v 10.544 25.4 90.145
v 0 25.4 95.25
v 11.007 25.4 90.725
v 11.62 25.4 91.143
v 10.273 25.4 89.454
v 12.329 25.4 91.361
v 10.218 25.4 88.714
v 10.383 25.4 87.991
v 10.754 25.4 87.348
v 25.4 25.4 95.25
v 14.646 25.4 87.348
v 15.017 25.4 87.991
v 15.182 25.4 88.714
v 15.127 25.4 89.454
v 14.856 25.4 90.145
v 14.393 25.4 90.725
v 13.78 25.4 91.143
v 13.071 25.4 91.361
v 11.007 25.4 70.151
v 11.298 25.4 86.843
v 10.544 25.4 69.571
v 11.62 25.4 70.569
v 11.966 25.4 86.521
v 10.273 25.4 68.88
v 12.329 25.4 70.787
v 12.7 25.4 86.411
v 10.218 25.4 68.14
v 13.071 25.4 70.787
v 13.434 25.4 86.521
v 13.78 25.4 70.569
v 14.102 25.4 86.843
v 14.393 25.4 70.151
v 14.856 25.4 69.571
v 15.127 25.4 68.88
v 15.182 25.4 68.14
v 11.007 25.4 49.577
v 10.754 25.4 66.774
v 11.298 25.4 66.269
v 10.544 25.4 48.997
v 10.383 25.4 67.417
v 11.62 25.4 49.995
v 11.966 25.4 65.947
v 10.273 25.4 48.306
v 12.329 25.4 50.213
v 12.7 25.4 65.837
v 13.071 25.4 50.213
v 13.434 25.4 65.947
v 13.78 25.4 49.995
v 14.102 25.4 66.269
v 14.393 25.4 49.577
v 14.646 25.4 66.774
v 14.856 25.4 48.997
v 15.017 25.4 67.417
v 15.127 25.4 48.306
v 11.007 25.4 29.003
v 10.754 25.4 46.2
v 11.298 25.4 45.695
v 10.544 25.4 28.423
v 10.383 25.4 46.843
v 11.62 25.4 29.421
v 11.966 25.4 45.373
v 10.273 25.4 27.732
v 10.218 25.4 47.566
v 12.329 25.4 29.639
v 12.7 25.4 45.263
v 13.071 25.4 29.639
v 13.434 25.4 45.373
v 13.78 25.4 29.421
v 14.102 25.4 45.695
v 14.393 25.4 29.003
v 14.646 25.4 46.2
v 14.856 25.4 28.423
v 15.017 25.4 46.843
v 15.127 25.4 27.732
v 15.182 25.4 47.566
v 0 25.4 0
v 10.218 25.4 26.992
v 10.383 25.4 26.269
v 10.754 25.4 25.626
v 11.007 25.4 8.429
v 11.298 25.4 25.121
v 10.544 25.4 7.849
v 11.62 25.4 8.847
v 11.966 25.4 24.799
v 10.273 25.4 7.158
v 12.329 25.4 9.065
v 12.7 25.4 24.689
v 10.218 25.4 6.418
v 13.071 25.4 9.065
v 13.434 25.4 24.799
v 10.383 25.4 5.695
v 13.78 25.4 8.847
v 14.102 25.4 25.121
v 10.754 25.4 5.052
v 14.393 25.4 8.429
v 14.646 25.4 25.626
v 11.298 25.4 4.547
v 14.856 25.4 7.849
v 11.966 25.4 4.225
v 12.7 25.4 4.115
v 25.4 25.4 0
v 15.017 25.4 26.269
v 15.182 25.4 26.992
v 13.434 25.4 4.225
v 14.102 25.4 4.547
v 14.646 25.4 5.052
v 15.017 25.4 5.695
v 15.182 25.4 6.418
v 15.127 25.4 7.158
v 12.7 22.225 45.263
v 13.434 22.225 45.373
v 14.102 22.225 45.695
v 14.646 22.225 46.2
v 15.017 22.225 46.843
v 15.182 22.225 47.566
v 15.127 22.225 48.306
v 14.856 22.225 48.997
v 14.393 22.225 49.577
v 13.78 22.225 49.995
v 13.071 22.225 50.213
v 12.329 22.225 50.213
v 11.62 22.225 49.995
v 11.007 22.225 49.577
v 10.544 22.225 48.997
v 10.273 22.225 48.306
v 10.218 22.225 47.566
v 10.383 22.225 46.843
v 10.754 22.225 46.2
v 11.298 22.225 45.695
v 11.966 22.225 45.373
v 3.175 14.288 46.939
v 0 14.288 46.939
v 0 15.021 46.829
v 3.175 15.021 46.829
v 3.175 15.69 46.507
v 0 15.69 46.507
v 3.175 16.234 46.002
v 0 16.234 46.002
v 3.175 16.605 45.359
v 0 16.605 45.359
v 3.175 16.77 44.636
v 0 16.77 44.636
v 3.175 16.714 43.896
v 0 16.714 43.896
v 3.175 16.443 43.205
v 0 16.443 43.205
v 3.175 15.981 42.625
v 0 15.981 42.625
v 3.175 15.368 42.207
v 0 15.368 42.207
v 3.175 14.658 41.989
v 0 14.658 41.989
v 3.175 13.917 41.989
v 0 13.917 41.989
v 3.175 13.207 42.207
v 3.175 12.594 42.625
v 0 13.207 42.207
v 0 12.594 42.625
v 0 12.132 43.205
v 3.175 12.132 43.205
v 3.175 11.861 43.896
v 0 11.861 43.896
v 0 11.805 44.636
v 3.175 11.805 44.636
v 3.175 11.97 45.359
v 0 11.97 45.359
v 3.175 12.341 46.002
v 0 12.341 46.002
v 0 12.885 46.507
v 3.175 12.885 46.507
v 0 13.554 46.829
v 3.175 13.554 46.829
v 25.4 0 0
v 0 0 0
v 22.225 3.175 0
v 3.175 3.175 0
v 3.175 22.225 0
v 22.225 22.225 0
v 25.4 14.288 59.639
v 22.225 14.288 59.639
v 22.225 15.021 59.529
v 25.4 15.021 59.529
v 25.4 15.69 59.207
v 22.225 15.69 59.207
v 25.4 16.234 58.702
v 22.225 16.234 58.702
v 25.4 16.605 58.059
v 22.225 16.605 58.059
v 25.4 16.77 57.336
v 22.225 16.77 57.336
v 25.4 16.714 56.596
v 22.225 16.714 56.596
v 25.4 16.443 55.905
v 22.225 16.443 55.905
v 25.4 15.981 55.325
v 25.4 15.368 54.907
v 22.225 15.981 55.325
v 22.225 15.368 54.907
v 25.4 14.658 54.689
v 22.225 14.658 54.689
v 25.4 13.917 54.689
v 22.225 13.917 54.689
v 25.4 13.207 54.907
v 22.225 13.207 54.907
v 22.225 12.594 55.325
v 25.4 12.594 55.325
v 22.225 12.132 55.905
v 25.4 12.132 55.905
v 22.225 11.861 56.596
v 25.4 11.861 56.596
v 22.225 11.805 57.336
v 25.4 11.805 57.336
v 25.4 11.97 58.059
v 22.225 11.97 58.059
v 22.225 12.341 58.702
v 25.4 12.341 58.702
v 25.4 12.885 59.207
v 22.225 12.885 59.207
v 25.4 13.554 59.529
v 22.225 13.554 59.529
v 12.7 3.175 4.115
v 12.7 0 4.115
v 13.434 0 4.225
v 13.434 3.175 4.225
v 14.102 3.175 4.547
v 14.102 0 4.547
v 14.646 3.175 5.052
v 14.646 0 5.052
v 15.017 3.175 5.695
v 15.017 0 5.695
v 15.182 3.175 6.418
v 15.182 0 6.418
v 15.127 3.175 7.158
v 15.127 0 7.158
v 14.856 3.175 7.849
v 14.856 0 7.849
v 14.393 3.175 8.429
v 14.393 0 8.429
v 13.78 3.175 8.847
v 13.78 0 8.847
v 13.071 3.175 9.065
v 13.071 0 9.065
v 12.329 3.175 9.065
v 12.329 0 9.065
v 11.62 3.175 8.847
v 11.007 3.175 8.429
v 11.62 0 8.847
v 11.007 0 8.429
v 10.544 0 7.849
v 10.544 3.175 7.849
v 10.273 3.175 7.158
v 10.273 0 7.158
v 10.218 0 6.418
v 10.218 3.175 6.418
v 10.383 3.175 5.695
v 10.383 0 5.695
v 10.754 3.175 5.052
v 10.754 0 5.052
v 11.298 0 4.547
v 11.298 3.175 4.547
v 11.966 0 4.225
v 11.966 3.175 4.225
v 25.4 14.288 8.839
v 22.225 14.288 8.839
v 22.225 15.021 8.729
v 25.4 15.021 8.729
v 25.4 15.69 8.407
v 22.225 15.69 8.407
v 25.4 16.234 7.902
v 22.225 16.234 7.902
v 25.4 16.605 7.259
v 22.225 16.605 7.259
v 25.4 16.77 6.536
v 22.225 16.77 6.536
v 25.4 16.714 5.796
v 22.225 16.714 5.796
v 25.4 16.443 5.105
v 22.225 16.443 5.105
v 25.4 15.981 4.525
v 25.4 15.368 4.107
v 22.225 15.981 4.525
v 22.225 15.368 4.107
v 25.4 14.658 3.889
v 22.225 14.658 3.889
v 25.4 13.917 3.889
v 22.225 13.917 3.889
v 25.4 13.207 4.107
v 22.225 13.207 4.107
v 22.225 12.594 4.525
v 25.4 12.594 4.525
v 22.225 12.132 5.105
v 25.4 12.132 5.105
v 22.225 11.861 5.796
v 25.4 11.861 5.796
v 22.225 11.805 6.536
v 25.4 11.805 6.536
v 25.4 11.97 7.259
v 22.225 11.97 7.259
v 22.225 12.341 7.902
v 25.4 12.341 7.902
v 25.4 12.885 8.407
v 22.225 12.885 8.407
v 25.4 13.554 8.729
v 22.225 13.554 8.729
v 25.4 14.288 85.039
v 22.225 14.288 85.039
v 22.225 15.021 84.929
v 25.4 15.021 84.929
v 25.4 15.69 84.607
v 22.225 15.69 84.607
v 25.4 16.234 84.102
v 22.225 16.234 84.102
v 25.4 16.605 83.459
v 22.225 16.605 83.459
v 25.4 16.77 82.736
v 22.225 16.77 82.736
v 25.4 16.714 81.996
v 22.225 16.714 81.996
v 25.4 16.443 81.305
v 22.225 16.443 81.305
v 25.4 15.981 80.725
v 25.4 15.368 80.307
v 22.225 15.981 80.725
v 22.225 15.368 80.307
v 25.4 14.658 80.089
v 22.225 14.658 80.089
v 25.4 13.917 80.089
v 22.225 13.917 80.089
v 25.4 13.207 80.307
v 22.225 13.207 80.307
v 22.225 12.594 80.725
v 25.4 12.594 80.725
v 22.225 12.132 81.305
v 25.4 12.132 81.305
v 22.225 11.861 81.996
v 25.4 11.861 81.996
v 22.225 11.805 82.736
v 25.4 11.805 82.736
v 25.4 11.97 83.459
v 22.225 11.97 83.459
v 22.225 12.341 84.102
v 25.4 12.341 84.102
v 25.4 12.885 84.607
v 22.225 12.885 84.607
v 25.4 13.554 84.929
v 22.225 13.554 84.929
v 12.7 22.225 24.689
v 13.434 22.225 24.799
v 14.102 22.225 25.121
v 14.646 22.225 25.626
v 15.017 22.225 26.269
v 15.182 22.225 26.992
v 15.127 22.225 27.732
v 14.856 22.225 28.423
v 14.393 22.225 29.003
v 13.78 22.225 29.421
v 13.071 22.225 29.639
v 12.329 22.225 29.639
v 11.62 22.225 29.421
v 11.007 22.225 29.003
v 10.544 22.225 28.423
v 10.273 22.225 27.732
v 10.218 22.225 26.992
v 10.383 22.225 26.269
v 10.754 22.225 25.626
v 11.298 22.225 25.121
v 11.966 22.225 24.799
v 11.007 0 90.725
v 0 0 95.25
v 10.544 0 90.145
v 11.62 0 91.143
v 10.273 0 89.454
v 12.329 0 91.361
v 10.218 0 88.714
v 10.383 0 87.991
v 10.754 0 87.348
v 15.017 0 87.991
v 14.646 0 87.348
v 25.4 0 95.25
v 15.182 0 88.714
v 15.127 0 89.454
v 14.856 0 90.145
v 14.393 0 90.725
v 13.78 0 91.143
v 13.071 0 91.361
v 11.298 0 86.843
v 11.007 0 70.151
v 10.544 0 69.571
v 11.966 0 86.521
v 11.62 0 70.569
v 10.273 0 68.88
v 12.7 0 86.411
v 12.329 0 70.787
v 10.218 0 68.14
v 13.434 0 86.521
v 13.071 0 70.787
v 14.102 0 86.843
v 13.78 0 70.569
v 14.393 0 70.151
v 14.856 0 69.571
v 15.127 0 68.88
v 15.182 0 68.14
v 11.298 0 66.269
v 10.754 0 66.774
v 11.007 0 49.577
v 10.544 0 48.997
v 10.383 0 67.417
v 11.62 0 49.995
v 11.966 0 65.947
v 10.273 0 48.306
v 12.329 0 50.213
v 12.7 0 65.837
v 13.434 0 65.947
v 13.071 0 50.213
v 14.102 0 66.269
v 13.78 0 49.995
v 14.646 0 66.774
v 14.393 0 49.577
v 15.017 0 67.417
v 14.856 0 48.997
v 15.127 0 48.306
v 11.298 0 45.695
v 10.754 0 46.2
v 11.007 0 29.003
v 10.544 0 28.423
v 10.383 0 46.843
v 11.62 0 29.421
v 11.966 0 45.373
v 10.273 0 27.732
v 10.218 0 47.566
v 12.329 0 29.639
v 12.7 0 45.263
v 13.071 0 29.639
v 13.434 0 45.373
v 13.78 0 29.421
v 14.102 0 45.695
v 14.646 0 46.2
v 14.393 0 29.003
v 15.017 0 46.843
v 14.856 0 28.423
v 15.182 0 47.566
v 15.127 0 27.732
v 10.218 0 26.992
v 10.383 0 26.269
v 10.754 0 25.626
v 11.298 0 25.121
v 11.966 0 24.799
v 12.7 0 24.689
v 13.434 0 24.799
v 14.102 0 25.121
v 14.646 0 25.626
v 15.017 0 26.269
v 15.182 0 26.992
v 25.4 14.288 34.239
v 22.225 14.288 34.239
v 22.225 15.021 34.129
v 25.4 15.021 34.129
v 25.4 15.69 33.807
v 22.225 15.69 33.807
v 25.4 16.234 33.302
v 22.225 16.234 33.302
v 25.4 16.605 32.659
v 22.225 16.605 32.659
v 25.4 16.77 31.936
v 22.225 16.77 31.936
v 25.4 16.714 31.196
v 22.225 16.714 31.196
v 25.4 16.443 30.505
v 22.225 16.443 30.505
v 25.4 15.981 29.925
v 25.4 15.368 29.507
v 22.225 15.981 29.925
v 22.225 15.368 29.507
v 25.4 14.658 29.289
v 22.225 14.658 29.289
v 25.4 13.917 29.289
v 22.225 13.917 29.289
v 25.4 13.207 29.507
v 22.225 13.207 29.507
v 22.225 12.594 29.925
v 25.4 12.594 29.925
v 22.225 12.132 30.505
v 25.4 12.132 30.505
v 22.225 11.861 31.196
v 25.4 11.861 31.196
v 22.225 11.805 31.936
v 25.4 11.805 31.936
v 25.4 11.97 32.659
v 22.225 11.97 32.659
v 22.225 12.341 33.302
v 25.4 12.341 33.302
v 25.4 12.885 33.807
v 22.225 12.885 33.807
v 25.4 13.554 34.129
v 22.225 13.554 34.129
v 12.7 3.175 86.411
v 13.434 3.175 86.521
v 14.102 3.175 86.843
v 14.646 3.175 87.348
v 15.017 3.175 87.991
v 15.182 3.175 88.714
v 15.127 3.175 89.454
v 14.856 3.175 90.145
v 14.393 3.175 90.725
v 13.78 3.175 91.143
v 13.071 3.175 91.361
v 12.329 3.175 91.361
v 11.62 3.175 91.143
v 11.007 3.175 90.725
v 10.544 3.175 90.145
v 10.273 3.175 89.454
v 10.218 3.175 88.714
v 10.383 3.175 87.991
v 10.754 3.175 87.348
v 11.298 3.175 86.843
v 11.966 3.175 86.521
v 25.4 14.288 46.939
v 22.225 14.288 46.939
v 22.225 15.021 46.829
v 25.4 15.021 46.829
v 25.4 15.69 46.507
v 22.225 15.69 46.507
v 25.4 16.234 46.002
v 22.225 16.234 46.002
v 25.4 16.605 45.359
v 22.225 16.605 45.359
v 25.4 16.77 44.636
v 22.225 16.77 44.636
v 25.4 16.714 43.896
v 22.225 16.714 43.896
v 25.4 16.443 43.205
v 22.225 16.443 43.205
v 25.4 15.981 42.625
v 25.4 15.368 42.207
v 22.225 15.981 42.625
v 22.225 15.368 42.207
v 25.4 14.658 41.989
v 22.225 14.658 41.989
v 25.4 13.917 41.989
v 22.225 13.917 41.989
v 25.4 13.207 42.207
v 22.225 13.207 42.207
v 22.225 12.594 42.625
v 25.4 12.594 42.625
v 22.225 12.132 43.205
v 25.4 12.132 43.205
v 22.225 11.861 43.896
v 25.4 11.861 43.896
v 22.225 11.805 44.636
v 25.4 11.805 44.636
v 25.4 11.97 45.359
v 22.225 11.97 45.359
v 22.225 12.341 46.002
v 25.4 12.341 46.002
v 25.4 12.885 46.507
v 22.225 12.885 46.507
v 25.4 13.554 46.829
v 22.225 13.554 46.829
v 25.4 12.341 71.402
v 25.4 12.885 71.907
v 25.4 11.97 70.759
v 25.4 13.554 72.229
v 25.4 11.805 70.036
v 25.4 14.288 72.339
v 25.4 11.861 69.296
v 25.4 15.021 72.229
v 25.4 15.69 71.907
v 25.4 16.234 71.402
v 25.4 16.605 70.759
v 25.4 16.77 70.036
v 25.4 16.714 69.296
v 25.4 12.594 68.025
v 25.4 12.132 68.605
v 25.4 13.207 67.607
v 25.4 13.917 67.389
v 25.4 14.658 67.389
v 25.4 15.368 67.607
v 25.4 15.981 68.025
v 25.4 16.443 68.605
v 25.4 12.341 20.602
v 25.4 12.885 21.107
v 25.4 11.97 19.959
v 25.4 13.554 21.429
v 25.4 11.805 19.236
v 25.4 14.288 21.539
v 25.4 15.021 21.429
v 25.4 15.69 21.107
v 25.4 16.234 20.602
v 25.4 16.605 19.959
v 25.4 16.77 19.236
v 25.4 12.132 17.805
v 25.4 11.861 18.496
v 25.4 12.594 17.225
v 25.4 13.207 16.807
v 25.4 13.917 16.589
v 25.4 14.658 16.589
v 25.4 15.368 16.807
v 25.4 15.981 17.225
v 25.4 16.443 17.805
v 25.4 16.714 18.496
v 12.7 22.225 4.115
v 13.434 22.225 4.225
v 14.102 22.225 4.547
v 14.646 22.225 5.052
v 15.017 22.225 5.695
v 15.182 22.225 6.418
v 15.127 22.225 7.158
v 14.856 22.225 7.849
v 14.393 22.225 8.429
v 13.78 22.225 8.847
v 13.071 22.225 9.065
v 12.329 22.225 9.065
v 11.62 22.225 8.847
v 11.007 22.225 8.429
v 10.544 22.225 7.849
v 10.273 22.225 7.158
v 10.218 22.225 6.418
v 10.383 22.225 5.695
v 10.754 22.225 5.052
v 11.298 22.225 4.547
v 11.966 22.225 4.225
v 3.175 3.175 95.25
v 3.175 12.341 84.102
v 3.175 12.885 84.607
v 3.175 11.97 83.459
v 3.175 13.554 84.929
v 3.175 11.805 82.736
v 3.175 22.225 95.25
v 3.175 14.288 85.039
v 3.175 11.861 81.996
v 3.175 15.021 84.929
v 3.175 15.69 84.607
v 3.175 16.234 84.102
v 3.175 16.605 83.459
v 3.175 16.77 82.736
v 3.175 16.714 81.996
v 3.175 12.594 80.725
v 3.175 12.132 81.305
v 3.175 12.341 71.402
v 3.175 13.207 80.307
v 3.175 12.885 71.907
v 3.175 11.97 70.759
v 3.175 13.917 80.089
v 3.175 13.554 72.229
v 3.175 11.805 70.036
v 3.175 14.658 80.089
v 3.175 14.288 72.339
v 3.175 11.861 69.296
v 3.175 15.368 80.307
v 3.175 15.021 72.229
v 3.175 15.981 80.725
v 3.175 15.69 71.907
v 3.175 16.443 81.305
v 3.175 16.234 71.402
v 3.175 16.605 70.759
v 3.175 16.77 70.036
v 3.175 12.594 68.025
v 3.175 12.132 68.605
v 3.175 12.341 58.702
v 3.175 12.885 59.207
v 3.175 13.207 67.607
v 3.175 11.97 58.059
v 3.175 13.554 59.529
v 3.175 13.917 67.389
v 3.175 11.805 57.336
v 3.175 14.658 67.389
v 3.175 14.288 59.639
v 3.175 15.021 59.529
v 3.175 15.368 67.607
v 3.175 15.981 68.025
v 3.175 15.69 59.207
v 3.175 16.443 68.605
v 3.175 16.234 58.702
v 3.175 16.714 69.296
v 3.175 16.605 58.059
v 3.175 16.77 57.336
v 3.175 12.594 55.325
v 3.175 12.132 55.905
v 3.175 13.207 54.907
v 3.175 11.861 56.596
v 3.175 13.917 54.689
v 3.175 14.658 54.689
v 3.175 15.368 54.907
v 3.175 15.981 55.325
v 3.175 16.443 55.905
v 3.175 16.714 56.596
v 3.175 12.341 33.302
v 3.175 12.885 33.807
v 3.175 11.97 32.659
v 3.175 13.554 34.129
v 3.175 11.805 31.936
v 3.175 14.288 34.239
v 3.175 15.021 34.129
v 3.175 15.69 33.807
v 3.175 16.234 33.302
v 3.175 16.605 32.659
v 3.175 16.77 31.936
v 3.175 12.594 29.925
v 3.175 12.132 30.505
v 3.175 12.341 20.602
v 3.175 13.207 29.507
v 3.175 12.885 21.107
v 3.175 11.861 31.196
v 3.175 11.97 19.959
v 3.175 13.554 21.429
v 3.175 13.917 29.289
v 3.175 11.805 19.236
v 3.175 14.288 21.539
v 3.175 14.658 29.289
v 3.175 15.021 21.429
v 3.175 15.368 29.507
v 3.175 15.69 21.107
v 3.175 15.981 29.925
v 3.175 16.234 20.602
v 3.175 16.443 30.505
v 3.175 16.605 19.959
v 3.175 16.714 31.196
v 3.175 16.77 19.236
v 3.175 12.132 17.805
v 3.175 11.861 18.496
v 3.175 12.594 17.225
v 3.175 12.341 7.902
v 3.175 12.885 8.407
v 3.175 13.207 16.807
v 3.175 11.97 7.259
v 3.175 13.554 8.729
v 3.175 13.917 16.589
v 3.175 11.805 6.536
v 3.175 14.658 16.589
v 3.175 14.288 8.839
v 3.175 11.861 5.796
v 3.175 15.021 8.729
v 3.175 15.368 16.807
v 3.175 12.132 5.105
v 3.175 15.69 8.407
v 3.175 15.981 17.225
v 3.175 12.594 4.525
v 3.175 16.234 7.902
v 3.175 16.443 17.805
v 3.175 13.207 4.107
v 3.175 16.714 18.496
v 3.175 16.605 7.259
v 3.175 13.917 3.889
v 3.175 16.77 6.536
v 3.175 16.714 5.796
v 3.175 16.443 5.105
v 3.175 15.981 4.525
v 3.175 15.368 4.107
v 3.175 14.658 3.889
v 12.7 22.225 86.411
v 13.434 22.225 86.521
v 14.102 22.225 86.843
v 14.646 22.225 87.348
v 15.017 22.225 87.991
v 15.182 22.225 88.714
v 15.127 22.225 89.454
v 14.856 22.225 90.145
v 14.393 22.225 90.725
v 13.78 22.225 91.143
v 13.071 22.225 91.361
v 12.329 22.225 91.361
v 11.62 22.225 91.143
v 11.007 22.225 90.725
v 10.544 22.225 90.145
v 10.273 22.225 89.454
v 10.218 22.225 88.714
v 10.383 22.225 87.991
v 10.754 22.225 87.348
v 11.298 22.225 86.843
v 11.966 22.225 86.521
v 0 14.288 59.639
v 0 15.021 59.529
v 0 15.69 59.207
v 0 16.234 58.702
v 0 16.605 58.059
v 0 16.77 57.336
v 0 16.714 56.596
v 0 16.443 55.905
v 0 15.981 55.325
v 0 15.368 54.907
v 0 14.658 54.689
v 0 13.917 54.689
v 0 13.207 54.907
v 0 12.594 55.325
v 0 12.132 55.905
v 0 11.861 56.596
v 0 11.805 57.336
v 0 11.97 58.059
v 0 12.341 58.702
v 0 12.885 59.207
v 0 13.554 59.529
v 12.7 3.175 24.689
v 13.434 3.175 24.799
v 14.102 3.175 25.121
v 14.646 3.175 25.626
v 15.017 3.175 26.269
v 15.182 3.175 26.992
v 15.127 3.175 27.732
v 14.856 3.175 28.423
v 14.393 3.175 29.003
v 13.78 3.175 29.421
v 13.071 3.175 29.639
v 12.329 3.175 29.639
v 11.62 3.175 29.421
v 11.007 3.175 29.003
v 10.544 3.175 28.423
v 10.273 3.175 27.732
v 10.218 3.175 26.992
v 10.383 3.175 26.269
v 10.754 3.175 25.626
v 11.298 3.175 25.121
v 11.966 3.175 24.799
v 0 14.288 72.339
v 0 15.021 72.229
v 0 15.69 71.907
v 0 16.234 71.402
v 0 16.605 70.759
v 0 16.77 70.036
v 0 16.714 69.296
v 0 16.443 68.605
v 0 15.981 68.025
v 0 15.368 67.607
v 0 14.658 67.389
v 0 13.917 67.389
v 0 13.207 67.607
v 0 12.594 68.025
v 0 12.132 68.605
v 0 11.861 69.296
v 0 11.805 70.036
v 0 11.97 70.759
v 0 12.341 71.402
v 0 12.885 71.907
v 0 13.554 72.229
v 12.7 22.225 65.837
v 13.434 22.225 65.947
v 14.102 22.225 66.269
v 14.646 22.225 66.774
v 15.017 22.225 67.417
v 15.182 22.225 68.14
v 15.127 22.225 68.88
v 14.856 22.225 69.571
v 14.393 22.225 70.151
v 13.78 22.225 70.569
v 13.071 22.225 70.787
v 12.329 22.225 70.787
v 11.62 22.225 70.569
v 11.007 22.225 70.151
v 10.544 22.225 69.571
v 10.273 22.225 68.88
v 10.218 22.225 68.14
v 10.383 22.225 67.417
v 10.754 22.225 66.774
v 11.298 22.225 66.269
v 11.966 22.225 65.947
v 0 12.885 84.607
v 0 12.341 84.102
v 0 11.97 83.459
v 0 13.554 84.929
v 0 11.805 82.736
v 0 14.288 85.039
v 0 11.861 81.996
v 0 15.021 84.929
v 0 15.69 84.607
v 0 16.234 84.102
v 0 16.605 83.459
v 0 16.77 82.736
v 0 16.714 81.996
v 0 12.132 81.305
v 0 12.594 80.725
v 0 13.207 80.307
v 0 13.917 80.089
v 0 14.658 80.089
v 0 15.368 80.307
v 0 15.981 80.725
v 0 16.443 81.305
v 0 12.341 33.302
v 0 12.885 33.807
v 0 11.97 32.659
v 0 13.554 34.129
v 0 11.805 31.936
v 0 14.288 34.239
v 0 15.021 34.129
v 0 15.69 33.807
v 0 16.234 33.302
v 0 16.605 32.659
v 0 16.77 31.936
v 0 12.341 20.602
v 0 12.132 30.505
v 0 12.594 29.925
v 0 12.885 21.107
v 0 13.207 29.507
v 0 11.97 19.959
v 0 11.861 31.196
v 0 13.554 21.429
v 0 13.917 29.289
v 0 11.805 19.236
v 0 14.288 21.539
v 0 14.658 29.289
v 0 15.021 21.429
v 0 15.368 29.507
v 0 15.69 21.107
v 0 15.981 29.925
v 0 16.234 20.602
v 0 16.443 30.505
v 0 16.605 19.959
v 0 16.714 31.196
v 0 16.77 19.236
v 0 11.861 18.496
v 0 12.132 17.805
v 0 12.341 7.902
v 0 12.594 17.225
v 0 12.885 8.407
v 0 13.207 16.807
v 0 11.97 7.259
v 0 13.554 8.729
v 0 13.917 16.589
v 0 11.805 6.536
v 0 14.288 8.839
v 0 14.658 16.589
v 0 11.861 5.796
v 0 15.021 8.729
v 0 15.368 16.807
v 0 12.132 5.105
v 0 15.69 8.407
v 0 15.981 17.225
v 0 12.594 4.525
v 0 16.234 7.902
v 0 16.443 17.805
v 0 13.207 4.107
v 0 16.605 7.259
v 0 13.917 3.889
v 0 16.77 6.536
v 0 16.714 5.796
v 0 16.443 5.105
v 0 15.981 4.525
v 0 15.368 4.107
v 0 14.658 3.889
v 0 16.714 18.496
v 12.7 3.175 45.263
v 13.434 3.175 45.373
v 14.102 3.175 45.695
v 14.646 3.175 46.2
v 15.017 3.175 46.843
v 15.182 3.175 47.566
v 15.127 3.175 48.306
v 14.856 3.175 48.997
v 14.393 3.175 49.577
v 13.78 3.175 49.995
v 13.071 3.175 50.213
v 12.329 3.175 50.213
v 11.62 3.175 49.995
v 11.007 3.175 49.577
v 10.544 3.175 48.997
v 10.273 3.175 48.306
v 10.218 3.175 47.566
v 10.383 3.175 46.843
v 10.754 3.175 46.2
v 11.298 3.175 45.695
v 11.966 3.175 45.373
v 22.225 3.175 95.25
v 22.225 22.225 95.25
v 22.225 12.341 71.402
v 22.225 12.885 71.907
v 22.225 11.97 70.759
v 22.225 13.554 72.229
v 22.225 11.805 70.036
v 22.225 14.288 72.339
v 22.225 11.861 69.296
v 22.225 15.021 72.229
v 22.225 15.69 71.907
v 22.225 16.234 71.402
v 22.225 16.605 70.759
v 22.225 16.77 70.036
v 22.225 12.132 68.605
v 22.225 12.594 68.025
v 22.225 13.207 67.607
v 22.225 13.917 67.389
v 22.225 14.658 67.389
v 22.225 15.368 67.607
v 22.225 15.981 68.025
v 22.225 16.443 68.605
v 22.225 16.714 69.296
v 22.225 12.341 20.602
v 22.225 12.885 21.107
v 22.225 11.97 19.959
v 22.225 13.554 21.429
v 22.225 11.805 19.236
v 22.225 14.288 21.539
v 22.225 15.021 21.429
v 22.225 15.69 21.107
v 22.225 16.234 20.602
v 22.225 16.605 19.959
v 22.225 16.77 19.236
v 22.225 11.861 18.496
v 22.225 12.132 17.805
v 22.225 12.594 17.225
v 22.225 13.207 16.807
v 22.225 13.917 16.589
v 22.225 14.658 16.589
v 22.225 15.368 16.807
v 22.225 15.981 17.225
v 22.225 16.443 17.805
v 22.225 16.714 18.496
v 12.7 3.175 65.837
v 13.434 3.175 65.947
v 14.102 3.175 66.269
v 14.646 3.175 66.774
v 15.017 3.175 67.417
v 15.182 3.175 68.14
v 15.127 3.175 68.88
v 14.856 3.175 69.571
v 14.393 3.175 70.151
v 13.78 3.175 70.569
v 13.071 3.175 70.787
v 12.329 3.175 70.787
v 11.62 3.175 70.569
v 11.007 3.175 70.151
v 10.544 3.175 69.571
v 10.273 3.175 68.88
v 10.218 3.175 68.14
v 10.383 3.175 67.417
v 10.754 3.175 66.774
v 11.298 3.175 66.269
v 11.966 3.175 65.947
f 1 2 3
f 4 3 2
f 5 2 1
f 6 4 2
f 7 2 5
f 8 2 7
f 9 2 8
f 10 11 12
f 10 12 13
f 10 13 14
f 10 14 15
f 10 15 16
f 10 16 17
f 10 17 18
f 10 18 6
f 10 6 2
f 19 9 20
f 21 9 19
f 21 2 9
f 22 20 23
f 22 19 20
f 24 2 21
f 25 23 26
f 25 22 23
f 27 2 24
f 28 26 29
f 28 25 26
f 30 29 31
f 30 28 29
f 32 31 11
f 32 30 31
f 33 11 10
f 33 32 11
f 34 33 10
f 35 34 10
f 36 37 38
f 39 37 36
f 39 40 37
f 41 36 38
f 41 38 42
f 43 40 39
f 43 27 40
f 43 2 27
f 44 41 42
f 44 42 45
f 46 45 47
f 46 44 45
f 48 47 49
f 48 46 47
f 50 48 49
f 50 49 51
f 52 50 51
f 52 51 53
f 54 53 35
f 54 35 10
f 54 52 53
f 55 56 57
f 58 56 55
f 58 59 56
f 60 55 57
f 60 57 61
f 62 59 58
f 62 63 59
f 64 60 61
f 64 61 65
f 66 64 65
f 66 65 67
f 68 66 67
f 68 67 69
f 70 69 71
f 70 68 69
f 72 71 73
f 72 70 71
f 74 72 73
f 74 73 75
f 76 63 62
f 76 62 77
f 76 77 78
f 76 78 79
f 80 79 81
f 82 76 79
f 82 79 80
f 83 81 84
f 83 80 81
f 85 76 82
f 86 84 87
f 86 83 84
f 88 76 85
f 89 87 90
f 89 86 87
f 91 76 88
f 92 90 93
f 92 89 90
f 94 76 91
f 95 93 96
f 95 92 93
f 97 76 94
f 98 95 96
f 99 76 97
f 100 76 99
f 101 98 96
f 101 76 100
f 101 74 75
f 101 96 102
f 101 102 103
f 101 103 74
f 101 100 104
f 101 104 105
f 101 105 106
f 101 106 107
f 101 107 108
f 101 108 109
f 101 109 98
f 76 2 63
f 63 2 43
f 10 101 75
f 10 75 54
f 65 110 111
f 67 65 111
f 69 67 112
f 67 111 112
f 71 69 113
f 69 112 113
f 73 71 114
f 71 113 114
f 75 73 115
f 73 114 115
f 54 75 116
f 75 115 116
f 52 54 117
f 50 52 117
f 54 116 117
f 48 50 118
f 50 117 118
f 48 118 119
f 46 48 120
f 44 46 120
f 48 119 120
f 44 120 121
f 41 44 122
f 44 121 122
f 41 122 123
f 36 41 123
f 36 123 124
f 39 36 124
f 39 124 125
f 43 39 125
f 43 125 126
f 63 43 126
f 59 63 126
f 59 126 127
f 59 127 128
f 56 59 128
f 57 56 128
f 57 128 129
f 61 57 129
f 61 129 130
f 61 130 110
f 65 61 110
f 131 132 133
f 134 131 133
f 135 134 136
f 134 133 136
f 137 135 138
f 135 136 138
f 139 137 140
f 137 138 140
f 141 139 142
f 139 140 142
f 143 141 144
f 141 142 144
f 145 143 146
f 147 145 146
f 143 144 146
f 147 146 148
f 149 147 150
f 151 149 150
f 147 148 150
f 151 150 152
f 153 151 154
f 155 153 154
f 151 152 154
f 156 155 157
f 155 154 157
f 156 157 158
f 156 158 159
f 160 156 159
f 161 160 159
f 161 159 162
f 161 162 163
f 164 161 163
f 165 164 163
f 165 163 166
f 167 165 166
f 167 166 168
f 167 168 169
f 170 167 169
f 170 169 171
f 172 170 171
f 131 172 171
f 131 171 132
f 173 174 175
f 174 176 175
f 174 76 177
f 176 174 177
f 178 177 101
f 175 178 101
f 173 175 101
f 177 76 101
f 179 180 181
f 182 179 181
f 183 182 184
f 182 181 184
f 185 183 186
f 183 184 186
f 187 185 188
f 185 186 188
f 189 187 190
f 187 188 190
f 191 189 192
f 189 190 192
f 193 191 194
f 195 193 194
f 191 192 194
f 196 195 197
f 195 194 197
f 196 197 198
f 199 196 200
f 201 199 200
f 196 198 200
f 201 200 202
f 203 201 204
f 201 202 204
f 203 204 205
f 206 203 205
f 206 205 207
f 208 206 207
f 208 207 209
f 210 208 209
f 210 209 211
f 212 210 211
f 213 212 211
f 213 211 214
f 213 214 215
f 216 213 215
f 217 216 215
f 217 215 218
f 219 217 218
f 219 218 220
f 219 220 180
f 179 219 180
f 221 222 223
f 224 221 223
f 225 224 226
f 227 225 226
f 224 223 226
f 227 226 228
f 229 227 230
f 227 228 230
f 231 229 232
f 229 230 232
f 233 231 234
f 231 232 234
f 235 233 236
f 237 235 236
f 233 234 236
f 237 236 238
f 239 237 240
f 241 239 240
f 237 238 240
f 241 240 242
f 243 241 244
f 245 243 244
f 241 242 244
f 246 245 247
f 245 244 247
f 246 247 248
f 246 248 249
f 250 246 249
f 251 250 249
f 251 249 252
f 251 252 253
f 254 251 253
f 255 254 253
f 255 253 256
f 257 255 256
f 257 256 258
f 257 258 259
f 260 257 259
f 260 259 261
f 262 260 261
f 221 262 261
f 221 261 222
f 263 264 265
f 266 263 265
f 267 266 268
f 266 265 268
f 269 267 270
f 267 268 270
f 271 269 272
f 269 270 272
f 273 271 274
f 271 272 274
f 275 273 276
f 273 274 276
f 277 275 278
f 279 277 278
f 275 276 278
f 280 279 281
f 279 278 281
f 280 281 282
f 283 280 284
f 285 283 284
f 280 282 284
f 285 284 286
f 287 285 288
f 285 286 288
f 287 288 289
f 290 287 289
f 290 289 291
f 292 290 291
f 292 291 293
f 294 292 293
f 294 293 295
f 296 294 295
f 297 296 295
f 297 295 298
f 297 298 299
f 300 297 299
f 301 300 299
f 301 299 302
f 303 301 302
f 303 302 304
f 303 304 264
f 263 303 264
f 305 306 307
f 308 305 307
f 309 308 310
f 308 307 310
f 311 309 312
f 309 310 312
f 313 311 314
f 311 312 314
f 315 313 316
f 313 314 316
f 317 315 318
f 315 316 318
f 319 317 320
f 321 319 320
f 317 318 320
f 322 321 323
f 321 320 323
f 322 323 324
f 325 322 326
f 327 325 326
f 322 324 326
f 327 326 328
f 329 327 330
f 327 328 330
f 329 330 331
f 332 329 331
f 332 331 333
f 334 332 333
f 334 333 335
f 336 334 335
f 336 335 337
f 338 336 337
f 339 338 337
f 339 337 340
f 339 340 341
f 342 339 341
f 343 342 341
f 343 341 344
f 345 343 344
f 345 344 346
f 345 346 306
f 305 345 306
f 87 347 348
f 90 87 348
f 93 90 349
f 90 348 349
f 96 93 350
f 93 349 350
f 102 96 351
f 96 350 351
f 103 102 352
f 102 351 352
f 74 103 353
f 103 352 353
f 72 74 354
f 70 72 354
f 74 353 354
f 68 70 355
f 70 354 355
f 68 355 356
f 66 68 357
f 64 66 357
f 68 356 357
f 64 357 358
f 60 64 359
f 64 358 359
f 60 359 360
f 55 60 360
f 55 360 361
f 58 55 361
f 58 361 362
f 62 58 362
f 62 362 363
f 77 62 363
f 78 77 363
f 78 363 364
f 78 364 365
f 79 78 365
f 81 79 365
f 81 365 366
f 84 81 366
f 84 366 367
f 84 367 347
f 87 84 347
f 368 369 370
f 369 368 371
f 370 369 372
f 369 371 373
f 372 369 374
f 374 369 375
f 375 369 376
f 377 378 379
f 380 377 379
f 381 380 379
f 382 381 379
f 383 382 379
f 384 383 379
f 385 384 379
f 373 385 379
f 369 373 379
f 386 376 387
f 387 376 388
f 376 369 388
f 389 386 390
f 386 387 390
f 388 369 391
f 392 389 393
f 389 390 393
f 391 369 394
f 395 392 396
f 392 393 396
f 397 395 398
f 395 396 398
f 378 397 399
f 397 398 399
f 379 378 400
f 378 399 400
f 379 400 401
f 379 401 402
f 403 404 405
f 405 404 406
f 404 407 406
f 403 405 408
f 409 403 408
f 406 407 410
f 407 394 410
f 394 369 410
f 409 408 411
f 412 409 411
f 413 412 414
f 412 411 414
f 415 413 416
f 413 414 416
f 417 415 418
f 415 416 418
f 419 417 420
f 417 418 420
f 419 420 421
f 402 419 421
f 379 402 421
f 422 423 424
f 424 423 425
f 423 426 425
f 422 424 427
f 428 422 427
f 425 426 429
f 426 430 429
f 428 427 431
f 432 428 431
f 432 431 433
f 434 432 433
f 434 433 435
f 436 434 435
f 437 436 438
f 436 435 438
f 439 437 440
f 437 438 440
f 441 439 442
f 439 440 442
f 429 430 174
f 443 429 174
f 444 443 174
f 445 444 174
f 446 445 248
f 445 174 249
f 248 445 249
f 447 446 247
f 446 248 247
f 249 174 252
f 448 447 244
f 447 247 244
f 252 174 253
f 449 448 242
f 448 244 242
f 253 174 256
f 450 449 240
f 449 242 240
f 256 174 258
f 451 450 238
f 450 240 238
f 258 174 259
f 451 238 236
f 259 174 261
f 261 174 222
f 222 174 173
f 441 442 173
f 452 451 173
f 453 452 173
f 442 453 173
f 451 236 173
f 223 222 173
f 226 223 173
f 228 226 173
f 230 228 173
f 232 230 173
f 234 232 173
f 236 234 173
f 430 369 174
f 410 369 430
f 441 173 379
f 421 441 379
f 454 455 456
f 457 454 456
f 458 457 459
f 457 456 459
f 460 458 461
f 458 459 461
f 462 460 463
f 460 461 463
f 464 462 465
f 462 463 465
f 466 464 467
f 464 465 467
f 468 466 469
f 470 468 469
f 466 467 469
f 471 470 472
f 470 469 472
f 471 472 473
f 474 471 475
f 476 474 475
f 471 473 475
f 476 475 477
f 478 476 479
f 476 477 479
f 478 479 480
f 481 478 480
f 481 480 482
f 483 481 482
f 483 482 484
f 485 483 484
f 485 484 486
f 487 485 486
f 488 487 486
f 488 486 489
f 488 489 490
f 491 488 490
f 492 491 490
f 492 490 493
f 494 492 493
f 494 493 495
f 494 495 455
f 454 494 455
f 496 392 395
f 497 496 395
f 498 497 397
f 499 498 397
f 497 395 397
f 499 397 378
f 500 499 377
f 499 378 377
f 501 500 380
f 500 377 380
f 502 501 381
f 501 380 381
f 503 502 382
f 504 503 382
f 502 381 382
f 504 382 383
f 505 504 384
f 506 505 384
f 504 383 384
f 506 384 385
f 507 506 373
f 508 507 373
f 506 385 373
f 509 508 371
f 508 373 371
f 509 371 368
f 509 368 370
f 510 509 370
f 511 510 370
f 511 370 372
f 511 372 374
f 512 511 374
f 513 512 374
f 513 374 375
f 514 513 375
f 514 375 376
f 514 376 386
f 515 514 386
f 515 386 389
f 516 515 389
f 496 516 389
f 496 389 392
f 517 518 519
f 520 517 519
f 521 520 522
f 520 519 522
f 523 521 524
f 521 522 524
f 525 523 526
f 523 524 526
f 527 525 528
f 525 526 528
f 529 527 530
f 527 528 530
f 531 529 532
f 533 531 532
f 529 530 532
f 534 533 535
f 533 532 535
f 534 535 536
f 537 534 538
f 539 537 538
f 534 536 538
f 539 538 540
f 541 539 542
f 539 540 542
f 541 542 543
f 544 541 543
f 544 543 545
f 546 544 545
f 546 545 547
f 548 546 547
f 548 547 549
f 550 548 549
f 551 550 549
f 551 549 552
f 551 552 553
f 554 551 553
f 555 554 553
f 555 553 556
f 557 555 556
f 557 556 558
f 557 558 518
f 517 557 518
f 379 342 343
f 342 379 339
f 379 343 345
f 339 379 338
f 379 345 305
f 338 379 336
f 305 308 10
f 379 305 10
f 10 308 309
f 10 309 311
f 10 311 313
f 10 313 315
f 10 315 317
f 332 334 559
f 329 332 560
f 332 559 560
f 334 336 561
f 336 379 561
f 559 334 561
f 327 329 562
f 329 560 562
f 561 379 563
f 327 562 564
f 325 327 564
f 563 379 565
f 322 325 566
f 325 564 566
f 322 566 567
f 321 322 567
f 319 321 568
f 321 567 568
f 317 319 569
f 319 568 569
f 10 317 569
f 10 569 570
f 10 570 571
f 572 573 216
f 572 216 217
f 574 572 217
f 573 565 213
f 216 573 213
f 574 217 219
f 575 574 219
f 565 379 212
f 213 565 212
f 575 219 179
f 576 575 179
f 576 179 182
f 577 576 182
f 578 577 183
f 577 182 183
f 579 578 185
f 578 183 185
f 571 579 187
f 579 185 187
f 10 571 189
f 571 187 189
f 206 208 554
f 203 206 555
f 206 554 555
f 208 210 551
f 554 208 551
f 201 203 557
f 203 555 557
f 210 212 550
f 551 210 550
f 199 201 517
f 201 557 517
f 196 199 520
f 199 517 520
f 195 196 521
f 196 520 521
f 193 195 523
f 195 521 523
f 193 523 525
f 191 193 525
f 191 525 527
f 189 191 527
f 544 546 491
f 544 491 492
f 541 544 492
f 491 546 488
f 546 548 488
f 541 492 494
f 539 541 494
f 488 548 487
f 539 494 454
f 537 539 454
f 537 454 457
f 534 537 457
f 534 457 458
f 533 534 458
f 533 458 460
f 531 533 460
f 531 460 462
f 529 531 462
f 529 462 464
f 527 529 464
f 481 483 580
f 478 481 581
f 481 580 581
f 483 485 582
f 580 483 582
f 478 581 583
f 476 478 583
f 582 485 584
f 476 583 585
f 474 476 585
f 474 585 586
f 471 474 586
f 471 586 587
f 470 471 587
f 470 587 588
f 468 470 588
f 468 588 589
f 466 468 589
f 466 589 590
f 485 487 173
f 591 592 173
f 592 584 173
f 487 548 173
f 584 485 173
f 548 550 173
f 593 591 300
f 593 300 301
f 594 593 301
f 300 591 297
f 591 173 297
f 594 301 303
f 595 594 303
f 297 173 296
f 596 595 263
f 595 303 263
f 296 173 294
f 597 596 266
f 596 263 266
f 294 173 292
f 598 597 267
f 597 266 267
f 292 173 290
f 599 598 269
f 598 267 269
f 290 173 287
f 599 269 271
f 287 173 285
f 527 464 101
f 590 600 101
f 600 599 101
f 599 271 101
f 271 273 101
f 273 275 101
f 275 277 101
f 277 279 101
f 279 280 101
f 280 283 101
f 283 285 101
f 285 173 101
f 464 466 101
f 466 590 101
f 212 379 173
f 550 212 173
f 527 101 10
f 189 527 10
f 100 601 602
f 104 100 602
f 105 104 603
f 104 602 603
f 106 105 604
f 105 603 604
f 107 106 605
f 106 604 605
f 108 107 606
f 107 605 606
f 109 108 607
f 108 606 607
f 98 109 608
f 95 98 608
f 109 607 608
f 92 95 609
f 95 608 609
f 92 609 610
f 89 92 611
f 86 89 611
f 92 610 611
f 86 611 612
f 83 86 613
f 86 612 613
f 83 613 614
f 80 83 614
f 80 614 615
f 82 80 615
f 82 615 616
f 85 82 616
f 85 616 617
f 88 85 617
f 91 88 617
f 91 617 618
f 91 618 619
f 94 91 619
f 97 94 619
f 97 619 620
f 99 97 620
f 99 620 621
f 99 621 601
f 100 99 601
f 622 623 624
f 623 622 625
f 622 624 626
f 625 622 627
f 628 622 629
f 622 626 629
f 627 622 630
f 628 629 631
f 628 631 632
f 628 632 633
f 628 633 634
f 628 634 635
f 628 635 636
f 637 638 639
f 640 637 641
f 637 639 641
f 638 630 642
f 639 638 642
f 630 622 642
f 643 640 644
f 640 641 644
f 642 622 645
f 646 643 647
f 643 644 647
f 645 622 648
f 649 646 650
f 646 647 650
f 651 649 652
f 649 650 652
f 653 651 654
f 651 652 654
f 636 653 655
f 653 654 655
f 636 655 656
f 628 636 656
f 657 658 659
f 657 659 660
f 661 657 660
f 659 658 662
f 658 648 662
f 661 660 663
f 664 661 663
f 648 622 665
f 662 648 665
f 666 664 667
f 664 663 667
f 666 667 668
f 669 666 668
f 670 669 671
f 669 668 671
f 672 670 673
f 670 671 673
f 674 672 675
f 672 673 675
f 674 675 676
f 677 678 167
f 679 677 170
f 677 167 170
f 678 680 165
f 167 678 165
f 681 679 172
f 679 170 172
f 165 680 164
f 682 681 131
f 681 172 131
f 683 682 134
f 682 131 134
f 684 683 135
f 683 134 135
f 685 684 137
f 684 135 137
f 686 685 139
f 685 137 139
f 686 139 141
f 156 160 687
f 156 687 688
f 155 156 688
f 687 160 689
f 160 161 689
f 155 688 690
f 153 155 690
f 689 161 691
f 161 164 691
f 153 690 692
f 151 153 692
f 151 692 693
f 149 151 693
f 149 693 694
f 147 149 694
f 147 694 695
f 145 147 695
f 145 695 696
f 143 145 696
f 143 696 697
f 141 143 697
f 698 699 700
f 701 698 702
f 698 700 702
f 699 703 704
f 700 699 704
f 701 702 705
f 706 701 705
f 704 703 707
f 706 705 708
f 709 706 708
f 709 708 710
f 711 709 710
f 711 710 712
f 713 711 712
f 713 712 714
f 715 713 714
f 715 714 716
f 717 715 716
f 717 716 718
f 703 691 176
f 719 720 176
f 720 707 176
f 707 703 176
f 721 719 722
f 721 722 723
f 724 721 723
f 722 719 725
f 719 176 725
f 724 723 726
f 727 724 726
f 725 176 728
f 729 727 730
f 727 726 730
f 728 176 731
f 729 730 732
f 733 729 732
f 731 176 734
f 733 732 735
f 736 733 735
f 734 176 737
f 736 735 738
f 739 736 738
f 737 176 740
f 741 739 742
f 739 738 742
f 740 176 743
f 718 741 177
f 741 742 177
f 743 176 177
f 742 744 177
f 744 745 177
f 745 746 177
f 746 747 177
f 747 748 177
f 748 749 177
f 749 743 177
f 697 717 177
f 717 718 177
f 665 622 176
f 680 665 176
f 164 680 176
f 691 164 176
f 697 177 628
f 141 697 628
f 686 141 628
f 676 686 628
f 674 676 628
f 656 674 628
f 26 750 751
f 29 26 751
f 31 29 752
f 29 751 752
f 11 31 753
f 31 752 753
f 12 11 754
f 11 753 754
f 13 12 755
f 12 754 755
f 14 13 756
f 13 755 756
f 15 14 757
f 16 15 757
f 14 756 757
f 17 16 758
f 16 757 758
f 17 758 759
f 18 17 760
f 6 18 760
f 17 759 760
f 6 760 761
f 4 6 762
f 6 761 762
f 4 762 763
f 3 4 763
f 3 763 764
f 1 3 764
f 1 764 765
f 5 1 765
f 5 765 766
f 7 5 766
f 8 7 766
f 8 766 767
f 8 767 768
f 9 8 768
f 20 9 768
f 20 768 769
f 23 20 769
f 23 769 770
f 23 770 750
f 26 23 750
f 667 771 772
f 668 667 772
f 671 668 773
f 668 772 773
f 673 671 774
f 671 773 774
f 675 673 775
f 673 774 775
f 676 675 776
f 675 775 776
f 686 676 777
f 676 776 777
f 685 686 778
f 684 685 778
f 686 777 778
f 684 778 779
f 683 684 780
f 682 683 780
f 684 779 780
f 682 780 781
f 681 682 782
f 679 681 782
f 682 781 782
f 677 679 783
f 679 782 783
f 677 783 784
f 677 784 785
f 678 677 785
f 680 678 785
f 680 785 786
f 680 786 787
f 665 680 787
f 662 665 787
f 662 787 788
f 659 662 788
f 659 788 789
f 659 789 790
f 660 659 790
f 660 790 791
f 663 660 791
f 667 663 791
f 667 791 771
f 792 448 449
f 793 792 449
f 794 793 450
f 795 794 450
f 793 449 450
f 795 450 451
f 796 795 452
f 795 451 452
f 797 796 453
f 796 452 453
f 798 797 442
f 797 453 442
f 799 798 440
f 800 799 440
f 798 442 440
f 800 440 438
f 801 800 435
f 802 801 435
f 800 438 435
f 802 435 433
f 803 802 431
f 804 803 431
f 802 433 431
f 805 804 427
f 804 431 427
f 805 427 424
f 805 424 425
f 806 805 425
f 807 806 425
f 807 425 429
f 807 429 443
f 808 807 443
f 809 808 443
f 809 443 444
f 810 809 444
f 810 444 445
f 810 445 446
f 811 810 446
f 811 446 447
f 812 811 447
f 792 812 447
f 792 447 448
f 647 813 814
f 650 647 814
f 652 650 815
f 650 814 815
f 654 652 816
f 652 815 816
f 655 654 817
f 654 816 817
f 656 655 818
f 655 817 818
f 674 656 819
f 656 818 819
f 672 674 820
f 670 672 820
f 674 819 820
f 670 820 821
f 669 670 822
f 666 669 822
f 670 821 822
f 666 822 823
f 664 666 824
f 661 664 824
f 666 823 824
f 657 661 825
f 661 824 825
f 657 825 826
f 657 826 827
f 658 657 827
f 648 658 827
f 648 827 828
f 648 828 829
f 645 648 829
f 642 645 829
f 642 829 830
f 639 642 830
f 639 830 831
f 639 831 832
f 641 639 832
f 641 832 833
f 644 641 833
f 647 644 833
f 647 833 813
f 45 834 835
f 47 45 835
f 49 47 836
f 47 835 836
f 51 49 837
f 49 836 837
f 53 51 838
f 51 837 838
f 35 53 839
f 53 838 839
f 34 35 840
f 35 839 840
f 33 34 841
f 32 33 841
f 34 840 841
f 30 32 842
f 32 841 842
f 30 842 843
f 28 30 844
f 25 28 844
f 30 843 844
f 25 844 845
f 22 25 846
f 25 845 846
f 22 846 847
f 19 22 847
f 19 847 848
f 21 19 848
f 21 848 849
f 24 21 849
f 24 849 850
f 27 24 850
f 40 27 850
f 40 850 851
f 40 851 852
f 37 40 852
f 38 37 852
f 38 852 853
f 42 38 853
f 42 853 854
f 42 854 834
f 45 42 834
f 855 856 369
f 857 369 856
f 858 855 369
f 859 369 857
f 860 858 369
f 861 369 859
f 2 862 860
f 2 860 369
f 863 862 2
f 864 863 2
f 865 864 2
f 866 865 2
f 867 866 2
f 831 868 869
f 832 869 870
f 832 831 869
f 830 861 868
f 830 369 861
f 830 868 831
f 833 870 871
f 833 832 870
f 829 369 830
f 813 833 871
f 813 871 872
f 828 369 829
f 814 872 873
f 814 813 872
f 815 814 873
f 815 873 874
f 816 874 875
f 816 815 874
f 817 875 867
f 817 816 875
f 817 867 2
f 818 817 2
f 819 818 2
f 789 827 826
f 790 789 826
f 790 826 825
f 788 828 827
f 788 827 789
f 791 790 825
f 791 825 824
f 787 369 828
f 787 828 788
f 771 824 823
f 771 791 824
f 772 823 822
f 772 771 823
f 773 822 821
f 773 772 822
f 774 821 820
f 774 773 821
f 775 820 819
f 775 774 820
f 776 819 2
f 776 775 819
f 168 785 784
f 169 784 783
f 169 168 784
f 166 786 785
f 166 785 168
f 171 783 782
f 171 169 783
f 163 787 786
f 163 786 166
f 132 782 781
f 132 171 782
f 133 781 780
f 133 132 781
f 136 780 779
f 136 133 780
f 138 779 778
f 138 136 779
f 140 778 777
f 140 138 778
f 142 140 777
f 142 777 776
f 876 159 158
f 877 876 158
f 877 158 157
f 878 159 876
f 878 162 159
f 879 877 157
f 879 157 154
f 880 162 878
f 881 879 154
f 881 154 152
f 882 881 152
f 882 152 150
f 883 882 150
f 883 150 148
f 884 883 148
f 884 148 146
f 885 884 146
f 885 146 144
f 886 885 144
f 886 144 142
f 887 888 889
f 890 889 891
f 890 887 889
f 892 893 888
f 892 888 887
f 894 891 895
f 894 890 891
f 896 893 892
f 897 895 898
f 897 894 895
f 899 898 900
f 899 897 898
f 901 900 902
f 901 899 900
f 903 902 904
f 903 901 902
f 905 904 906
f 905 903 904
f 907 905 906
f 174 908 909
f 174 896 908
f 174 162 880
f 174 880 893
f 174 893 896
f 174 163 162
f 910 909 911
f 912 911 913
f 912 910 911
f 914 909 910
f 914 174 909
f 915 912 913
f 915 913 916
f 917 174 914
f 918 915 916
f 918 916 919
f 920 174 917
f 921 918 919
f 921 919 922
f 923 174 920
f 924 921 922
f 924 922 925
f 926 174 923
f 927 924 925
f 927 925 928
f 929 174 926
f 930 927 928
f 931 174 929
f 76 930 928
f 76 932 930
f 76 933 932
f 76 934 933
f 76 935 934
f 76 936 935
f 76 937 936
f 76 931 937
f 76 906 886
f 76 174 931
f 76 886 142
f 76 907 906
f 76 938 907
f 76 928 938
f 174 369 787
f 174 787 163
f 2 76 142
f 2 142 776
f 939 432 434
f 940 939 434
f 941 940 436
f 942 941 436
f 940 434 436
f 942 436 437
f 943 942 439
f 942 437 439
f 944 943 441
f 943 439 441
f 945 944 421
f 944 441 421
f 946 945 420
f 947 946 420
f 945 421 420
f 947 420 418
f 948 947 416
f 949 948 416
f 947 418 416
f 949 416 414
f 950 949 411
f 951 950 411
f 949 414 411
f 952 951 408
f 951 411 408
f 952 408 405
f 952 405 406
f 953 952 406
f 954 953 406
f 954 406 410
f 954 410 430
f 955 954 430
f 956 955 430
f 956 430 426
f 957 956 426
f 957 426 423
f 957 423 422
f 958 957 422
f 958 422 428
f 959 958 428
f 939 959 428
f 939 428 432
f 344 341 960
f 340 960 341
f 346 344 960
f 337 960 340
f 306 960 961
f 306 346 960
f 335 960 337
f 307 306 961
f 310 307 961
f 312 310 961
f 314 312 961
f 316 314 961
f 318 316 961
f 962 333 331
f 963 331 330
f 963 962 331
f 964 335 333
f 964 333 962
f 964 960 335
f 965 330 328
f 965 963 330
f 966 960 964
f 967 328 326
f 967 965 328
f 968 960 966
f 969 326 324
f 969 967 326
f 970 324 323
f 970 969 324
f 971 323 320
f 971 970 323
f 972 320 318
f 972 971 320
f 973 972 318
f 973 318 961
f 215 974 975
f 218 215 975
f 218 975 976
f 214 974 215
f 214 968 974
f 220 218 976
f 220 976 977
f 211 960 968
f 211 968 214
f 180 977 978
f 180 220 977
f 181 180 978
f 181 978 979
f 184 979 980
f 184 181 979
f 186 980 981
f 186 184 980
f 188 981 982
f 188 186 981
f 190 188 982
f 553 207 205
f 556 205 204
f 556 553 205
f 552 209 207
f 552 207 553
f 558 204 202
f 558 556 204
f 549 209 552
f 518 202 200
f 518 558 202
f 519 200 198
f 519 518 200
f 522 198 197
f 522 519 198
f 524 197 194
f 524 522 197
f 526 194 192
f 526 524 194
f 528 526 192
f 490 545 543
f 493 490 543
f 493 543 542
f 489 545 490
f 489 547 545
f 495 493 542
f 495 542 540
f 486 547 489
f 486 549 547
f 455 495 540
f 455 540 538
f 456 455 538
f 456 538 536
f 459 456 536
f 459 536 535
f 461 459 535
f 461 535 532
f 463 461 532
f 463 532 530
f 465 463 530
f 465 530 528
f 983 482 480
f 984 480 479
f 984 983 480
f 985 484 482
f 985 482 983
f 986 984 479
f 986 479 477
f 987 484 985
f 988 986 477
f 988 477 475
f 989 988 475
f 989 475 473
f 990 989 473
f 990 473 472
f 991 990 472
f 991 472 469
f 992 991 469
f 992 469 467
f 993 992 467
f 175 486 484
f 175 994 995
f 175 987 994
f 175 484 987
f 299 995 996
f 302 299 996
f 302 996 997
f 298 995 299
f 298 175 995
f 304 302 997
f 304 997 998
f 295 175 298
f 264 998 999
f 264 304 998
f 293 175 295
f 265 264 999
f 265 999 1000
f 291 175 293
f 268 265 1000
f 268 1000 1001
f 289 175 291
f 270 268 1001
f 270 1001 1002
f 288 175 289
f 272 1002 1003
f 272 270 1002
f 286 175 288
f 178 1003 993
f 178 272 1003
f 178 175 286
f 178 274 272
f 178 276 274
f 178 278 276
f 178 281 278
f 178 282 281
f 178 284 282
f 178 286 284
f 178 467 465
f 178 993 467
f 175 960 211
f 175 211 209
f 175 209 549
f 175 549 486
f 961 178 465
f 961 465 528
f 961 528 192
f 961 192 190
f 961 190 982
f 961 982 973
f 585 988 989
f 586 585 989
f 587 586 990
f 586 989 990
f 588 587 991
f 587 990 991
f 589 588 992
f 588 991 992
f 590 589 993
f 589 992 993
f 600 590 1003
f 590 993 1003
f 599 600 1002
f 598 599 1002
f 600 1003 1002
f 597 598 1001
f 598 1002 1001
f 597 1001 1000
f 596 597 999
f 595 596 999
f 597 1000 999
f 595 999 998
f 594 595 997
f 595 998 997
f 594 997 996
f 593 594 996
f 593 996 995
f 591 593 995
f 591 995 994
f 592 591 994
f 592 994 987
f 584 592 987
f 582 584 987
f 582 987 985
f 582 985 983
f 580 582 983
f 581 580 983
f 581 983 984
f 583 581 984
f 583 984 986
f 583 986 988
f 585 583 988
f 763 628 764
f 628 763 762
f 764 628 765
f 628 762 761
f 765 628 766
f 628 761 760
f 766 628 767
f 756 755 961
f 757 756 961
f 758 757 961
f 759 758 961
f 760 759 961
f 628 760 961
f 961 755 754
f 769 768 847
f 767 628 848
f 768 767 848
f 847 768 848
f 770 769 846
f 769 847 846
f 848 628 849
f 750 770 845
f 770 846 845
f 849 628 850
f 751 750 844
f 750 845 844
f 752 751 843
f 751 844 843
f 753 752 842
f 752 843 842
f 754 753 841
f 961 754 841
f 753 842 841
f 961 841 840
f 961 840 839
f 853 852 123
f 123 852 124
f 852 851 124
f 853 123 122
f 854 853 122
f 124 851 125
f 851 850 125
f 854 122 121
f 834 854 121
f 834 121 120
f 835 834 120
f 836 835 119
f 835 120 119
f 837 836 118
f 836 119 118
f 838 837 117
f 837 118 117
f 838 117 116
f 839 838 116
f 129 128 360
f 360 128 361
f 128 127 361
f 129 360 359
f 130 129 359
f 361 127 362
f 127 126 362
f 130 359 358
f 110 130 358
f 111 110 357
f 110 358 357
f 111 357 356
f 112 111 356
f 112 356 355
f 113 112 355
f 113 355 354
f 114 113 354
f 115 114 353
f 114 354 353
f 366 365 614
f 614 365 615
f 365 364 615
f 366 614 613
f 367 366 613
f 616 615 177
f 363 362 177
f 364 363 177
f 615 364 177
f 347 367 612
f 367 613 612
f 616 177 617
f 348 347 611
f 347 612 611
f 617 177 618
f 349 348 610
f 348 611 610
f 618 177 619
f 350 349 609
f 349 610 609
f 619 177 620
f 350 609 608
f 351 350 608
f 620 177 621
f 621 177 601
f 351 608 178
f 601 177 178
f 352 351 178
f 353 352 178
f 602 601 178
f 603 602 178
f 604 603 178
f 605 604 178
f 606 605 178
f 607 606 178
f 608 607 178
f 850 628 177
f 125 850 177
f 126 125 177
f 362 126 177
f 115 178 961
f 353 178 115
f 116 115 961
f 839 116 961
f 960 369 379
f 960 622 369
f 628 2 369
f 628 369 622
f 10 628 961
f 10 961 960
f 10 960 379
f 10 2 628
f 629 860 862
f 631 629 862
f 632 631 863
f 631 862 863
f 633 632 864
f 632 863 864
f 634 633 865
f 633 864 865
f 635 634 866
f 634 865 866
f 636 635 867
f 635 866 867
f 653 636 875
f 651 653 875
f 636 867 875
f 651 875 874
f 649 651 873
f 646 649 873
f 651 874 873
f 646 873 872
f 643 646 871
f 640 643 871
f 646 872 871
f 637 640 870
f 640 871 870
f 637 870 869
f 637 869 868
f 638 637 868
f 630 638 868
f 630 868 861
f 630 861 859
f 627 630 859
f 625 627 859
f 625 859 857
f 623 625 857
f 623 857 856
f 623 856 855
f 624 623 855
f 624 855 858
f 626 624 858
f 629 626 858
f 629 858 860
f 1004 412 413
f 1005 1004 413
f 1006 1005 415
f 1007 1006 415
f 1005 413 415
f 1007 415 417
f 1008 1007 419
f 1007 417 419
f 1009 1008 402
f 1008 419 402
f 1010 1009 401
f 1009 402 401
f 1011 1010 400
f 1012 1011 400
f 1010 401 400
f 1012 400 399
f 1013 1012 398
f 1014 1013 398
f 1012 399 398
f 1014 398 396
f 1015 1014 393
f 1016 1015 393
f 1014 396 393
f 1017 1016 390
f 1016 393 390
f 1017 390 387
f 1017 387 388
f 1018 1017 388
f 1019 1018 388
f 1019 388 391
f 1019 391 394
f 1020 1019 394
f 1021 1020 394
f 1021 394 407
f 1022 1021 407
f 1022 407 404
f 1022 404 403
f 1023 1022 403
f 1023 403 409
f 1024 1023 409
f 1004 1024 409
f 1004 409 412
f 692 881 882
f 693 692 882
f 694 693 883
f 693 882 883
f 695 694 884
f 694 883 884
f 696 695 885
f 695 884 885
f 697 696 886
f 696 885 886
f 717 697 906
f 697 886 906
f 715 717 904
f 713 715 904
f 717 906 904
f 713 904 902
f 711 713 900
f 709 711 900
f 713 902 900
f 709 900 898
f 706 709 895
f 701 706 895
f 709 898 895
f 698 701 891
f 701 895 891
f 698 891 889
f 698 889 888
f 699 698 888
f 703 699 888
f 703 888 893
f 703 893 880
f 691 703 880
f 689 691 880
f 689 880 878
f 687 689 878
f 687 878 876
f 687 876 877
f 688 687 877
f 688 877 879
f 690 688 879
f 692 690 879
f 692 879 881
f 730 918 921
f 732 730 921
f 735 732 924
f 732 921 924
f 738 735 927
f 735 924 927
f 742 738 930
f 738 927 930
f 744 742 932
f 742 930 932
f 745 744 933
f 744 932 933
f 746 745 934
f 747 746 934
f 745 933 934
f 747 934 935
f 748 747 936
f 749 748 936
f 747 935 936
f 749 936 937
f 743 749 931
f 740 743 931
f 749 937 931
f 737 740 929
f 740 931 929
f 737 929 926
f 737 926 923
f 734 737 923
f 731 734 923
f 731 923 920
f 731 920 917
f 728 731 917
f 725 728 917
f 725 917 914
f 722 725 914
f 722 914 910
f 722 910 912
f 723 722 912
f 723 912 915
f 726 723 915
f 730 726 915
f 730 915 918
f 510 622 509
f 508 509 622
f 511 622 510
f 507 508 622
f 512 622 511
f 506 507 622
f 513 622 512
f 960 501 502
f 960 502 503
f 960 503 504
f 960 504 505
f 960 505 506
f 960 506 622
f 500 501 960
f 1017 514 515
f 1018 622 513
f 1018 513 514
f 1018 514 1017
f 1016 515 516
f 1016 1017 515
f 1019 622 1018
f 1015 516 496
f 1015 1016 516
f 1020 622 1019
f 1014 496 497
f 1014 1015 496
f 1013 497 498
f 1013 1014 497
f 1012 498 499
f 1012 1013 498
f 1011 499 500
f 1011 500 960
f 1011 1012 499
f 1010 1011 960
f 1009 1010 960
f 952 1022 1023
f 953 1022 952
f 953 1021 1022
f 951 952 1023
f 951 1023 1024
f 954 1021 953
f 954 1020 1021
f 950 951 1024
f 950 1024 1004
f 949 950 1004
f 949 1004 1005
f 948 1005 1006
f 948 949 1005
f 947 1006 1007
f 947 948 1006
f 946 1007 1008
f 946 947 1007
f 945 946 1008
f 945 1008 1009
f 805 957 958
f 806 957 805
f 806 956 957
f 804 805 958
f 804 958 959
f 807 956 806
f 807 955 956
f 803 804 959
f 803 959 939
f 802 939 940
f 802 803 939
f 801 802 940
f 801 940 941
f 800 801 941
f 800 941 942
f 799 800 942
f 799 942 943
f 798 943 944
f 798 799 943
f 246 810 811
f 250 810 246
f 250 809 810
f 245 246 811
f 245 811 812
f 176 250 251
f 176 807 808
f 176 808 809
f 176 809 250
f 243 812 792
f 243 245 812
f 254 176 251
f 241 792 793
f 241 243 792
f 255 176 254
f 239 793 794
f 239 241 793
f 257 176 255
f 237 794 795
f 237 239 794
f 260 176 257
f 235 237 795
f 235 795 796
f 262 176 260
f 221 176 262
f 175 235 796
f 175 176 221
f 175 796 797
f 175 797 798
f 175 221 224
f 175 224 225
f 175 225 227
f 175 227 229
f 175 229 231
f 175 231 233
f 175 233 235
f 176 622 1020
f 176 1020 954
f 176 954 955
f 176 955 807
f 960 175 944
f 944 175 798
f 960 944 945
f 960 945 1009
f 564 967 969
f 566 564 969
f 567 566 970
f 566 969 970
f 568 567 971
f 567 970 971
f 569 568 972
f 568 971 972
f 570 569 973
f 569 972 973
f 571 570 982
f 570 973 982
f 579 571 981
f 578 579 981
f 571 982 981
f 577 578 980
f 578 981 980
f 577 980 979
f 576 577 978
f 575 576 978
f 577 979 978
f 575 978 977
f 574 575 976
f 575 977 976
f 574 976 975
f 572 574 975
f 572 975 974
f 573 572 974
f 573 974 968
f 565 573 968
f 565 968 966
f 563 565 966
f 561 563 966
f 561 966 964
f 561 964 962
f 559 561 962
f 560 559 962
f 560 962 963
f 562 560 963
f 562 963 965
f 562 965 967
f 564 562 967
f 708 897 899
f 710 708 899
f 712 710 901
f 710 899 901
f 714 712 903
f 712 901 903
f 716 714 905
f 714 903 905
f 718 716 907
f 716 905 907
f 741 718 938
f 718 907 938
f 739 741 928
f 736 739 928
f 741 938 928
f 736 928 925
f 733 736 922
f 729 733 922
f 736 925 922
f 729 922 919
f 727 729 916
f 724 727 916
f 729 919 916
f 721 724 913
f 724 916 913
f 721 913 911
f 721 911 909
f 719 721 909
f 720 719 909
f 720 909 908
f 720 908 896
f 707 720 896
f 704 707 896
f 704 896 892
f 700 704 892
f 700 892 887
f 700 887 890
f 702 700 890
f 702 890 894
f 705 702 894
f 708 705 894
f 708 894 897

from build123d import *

# Parameters (mm, degrees)
SKETCH1_W           = 25.4
SKETCH1_H           = 25.4
SKETCH1_W_2         = 19.05
SKETCH1_H_2         = 19.05
BOSS_EXTRUDE1_DEPTH = 95.25
SKETCH2_R           = 2.4892
CUT_EXTRUDE1_DEPTH  = 95.25
SKETCH5_R           = 2.4892
CUT_EXTRUDE3_DEPTH  = 95.25


with BuildPart() as part:
    # Sketch1 → Boss-Extrude1 (new body)
    with BuildSketch(Plane.XY):
        with Locations((12.7, 12.7)):
            Rectangle(SKETCH1_W, SKETCH1_H)
        with Locations((12.7, 12.7)):
            Rectangle(SKETCH1_W_2, SKETCH1_H_2, mode=Mode.SUBTRACT)
    extrude(amount=BOSS_EXTRUDE1_DEPTH)

    # Sketch2 → Cut-Extrude1 (cut)
    with BuildSketch(Plane.ZY):
        with Locations((82.55, 14.2875)):
            Circle(SKETCH2_R)
        with Locations((69.85, 14.2875)):
            Circle(SKETCH2_R)
        with Locations((57.15, 14.2875)):
            Circle(SKETCH2_R)
        with Locations((44.45, 14.2875)):
            Circle(SKETCH2_R)
        with Locations((31.75, 14.2875)):
            Circle(SKETCH2_R)
        with Locations((19.05, 14.2875)):
            Circle(SKETCH2_R)
        with Locations((6.35, 14.2875)):
            Circle(SKETCH2_R)
    extrude(amount=-CUT_EXTRUDE1_DEPTH, mode=Mode.SUBTRACT)

    # Sketch5 → Cut-Extrude3 (cut)
    with BuildSketch(Plane(origin=(0, 0, 0), x_dir=(-1, 0, 0), z_dir=(0, -1, 0))):
        with Locations(Location((-12.7, -88.9, 0), (0, 0, 90))):
            Circle(SKETCH5_R)
        with Locations(Location((-12.7, -68.326, 0), (0, 0, 90))):
            Circle(SKETCH5_R)
        with Locations(Location((-12.7, -47.752, 0), (0, 0, 90))):
            Circle(SKETCH5_R)
        with Locations(Location((-12.7, -27.178, 0), (0, 0, 90))):
            Circle(SKETCH5_R)
        with Locations(Location((-12.7, -6.604, 0), (0, 0, 90))):
            Circle(SKETCH5_R)
    extrude(amount=-CUT_EXTRUDE3_DEPTH, mode=Mode.SUBTRACT)


solid = part.part
